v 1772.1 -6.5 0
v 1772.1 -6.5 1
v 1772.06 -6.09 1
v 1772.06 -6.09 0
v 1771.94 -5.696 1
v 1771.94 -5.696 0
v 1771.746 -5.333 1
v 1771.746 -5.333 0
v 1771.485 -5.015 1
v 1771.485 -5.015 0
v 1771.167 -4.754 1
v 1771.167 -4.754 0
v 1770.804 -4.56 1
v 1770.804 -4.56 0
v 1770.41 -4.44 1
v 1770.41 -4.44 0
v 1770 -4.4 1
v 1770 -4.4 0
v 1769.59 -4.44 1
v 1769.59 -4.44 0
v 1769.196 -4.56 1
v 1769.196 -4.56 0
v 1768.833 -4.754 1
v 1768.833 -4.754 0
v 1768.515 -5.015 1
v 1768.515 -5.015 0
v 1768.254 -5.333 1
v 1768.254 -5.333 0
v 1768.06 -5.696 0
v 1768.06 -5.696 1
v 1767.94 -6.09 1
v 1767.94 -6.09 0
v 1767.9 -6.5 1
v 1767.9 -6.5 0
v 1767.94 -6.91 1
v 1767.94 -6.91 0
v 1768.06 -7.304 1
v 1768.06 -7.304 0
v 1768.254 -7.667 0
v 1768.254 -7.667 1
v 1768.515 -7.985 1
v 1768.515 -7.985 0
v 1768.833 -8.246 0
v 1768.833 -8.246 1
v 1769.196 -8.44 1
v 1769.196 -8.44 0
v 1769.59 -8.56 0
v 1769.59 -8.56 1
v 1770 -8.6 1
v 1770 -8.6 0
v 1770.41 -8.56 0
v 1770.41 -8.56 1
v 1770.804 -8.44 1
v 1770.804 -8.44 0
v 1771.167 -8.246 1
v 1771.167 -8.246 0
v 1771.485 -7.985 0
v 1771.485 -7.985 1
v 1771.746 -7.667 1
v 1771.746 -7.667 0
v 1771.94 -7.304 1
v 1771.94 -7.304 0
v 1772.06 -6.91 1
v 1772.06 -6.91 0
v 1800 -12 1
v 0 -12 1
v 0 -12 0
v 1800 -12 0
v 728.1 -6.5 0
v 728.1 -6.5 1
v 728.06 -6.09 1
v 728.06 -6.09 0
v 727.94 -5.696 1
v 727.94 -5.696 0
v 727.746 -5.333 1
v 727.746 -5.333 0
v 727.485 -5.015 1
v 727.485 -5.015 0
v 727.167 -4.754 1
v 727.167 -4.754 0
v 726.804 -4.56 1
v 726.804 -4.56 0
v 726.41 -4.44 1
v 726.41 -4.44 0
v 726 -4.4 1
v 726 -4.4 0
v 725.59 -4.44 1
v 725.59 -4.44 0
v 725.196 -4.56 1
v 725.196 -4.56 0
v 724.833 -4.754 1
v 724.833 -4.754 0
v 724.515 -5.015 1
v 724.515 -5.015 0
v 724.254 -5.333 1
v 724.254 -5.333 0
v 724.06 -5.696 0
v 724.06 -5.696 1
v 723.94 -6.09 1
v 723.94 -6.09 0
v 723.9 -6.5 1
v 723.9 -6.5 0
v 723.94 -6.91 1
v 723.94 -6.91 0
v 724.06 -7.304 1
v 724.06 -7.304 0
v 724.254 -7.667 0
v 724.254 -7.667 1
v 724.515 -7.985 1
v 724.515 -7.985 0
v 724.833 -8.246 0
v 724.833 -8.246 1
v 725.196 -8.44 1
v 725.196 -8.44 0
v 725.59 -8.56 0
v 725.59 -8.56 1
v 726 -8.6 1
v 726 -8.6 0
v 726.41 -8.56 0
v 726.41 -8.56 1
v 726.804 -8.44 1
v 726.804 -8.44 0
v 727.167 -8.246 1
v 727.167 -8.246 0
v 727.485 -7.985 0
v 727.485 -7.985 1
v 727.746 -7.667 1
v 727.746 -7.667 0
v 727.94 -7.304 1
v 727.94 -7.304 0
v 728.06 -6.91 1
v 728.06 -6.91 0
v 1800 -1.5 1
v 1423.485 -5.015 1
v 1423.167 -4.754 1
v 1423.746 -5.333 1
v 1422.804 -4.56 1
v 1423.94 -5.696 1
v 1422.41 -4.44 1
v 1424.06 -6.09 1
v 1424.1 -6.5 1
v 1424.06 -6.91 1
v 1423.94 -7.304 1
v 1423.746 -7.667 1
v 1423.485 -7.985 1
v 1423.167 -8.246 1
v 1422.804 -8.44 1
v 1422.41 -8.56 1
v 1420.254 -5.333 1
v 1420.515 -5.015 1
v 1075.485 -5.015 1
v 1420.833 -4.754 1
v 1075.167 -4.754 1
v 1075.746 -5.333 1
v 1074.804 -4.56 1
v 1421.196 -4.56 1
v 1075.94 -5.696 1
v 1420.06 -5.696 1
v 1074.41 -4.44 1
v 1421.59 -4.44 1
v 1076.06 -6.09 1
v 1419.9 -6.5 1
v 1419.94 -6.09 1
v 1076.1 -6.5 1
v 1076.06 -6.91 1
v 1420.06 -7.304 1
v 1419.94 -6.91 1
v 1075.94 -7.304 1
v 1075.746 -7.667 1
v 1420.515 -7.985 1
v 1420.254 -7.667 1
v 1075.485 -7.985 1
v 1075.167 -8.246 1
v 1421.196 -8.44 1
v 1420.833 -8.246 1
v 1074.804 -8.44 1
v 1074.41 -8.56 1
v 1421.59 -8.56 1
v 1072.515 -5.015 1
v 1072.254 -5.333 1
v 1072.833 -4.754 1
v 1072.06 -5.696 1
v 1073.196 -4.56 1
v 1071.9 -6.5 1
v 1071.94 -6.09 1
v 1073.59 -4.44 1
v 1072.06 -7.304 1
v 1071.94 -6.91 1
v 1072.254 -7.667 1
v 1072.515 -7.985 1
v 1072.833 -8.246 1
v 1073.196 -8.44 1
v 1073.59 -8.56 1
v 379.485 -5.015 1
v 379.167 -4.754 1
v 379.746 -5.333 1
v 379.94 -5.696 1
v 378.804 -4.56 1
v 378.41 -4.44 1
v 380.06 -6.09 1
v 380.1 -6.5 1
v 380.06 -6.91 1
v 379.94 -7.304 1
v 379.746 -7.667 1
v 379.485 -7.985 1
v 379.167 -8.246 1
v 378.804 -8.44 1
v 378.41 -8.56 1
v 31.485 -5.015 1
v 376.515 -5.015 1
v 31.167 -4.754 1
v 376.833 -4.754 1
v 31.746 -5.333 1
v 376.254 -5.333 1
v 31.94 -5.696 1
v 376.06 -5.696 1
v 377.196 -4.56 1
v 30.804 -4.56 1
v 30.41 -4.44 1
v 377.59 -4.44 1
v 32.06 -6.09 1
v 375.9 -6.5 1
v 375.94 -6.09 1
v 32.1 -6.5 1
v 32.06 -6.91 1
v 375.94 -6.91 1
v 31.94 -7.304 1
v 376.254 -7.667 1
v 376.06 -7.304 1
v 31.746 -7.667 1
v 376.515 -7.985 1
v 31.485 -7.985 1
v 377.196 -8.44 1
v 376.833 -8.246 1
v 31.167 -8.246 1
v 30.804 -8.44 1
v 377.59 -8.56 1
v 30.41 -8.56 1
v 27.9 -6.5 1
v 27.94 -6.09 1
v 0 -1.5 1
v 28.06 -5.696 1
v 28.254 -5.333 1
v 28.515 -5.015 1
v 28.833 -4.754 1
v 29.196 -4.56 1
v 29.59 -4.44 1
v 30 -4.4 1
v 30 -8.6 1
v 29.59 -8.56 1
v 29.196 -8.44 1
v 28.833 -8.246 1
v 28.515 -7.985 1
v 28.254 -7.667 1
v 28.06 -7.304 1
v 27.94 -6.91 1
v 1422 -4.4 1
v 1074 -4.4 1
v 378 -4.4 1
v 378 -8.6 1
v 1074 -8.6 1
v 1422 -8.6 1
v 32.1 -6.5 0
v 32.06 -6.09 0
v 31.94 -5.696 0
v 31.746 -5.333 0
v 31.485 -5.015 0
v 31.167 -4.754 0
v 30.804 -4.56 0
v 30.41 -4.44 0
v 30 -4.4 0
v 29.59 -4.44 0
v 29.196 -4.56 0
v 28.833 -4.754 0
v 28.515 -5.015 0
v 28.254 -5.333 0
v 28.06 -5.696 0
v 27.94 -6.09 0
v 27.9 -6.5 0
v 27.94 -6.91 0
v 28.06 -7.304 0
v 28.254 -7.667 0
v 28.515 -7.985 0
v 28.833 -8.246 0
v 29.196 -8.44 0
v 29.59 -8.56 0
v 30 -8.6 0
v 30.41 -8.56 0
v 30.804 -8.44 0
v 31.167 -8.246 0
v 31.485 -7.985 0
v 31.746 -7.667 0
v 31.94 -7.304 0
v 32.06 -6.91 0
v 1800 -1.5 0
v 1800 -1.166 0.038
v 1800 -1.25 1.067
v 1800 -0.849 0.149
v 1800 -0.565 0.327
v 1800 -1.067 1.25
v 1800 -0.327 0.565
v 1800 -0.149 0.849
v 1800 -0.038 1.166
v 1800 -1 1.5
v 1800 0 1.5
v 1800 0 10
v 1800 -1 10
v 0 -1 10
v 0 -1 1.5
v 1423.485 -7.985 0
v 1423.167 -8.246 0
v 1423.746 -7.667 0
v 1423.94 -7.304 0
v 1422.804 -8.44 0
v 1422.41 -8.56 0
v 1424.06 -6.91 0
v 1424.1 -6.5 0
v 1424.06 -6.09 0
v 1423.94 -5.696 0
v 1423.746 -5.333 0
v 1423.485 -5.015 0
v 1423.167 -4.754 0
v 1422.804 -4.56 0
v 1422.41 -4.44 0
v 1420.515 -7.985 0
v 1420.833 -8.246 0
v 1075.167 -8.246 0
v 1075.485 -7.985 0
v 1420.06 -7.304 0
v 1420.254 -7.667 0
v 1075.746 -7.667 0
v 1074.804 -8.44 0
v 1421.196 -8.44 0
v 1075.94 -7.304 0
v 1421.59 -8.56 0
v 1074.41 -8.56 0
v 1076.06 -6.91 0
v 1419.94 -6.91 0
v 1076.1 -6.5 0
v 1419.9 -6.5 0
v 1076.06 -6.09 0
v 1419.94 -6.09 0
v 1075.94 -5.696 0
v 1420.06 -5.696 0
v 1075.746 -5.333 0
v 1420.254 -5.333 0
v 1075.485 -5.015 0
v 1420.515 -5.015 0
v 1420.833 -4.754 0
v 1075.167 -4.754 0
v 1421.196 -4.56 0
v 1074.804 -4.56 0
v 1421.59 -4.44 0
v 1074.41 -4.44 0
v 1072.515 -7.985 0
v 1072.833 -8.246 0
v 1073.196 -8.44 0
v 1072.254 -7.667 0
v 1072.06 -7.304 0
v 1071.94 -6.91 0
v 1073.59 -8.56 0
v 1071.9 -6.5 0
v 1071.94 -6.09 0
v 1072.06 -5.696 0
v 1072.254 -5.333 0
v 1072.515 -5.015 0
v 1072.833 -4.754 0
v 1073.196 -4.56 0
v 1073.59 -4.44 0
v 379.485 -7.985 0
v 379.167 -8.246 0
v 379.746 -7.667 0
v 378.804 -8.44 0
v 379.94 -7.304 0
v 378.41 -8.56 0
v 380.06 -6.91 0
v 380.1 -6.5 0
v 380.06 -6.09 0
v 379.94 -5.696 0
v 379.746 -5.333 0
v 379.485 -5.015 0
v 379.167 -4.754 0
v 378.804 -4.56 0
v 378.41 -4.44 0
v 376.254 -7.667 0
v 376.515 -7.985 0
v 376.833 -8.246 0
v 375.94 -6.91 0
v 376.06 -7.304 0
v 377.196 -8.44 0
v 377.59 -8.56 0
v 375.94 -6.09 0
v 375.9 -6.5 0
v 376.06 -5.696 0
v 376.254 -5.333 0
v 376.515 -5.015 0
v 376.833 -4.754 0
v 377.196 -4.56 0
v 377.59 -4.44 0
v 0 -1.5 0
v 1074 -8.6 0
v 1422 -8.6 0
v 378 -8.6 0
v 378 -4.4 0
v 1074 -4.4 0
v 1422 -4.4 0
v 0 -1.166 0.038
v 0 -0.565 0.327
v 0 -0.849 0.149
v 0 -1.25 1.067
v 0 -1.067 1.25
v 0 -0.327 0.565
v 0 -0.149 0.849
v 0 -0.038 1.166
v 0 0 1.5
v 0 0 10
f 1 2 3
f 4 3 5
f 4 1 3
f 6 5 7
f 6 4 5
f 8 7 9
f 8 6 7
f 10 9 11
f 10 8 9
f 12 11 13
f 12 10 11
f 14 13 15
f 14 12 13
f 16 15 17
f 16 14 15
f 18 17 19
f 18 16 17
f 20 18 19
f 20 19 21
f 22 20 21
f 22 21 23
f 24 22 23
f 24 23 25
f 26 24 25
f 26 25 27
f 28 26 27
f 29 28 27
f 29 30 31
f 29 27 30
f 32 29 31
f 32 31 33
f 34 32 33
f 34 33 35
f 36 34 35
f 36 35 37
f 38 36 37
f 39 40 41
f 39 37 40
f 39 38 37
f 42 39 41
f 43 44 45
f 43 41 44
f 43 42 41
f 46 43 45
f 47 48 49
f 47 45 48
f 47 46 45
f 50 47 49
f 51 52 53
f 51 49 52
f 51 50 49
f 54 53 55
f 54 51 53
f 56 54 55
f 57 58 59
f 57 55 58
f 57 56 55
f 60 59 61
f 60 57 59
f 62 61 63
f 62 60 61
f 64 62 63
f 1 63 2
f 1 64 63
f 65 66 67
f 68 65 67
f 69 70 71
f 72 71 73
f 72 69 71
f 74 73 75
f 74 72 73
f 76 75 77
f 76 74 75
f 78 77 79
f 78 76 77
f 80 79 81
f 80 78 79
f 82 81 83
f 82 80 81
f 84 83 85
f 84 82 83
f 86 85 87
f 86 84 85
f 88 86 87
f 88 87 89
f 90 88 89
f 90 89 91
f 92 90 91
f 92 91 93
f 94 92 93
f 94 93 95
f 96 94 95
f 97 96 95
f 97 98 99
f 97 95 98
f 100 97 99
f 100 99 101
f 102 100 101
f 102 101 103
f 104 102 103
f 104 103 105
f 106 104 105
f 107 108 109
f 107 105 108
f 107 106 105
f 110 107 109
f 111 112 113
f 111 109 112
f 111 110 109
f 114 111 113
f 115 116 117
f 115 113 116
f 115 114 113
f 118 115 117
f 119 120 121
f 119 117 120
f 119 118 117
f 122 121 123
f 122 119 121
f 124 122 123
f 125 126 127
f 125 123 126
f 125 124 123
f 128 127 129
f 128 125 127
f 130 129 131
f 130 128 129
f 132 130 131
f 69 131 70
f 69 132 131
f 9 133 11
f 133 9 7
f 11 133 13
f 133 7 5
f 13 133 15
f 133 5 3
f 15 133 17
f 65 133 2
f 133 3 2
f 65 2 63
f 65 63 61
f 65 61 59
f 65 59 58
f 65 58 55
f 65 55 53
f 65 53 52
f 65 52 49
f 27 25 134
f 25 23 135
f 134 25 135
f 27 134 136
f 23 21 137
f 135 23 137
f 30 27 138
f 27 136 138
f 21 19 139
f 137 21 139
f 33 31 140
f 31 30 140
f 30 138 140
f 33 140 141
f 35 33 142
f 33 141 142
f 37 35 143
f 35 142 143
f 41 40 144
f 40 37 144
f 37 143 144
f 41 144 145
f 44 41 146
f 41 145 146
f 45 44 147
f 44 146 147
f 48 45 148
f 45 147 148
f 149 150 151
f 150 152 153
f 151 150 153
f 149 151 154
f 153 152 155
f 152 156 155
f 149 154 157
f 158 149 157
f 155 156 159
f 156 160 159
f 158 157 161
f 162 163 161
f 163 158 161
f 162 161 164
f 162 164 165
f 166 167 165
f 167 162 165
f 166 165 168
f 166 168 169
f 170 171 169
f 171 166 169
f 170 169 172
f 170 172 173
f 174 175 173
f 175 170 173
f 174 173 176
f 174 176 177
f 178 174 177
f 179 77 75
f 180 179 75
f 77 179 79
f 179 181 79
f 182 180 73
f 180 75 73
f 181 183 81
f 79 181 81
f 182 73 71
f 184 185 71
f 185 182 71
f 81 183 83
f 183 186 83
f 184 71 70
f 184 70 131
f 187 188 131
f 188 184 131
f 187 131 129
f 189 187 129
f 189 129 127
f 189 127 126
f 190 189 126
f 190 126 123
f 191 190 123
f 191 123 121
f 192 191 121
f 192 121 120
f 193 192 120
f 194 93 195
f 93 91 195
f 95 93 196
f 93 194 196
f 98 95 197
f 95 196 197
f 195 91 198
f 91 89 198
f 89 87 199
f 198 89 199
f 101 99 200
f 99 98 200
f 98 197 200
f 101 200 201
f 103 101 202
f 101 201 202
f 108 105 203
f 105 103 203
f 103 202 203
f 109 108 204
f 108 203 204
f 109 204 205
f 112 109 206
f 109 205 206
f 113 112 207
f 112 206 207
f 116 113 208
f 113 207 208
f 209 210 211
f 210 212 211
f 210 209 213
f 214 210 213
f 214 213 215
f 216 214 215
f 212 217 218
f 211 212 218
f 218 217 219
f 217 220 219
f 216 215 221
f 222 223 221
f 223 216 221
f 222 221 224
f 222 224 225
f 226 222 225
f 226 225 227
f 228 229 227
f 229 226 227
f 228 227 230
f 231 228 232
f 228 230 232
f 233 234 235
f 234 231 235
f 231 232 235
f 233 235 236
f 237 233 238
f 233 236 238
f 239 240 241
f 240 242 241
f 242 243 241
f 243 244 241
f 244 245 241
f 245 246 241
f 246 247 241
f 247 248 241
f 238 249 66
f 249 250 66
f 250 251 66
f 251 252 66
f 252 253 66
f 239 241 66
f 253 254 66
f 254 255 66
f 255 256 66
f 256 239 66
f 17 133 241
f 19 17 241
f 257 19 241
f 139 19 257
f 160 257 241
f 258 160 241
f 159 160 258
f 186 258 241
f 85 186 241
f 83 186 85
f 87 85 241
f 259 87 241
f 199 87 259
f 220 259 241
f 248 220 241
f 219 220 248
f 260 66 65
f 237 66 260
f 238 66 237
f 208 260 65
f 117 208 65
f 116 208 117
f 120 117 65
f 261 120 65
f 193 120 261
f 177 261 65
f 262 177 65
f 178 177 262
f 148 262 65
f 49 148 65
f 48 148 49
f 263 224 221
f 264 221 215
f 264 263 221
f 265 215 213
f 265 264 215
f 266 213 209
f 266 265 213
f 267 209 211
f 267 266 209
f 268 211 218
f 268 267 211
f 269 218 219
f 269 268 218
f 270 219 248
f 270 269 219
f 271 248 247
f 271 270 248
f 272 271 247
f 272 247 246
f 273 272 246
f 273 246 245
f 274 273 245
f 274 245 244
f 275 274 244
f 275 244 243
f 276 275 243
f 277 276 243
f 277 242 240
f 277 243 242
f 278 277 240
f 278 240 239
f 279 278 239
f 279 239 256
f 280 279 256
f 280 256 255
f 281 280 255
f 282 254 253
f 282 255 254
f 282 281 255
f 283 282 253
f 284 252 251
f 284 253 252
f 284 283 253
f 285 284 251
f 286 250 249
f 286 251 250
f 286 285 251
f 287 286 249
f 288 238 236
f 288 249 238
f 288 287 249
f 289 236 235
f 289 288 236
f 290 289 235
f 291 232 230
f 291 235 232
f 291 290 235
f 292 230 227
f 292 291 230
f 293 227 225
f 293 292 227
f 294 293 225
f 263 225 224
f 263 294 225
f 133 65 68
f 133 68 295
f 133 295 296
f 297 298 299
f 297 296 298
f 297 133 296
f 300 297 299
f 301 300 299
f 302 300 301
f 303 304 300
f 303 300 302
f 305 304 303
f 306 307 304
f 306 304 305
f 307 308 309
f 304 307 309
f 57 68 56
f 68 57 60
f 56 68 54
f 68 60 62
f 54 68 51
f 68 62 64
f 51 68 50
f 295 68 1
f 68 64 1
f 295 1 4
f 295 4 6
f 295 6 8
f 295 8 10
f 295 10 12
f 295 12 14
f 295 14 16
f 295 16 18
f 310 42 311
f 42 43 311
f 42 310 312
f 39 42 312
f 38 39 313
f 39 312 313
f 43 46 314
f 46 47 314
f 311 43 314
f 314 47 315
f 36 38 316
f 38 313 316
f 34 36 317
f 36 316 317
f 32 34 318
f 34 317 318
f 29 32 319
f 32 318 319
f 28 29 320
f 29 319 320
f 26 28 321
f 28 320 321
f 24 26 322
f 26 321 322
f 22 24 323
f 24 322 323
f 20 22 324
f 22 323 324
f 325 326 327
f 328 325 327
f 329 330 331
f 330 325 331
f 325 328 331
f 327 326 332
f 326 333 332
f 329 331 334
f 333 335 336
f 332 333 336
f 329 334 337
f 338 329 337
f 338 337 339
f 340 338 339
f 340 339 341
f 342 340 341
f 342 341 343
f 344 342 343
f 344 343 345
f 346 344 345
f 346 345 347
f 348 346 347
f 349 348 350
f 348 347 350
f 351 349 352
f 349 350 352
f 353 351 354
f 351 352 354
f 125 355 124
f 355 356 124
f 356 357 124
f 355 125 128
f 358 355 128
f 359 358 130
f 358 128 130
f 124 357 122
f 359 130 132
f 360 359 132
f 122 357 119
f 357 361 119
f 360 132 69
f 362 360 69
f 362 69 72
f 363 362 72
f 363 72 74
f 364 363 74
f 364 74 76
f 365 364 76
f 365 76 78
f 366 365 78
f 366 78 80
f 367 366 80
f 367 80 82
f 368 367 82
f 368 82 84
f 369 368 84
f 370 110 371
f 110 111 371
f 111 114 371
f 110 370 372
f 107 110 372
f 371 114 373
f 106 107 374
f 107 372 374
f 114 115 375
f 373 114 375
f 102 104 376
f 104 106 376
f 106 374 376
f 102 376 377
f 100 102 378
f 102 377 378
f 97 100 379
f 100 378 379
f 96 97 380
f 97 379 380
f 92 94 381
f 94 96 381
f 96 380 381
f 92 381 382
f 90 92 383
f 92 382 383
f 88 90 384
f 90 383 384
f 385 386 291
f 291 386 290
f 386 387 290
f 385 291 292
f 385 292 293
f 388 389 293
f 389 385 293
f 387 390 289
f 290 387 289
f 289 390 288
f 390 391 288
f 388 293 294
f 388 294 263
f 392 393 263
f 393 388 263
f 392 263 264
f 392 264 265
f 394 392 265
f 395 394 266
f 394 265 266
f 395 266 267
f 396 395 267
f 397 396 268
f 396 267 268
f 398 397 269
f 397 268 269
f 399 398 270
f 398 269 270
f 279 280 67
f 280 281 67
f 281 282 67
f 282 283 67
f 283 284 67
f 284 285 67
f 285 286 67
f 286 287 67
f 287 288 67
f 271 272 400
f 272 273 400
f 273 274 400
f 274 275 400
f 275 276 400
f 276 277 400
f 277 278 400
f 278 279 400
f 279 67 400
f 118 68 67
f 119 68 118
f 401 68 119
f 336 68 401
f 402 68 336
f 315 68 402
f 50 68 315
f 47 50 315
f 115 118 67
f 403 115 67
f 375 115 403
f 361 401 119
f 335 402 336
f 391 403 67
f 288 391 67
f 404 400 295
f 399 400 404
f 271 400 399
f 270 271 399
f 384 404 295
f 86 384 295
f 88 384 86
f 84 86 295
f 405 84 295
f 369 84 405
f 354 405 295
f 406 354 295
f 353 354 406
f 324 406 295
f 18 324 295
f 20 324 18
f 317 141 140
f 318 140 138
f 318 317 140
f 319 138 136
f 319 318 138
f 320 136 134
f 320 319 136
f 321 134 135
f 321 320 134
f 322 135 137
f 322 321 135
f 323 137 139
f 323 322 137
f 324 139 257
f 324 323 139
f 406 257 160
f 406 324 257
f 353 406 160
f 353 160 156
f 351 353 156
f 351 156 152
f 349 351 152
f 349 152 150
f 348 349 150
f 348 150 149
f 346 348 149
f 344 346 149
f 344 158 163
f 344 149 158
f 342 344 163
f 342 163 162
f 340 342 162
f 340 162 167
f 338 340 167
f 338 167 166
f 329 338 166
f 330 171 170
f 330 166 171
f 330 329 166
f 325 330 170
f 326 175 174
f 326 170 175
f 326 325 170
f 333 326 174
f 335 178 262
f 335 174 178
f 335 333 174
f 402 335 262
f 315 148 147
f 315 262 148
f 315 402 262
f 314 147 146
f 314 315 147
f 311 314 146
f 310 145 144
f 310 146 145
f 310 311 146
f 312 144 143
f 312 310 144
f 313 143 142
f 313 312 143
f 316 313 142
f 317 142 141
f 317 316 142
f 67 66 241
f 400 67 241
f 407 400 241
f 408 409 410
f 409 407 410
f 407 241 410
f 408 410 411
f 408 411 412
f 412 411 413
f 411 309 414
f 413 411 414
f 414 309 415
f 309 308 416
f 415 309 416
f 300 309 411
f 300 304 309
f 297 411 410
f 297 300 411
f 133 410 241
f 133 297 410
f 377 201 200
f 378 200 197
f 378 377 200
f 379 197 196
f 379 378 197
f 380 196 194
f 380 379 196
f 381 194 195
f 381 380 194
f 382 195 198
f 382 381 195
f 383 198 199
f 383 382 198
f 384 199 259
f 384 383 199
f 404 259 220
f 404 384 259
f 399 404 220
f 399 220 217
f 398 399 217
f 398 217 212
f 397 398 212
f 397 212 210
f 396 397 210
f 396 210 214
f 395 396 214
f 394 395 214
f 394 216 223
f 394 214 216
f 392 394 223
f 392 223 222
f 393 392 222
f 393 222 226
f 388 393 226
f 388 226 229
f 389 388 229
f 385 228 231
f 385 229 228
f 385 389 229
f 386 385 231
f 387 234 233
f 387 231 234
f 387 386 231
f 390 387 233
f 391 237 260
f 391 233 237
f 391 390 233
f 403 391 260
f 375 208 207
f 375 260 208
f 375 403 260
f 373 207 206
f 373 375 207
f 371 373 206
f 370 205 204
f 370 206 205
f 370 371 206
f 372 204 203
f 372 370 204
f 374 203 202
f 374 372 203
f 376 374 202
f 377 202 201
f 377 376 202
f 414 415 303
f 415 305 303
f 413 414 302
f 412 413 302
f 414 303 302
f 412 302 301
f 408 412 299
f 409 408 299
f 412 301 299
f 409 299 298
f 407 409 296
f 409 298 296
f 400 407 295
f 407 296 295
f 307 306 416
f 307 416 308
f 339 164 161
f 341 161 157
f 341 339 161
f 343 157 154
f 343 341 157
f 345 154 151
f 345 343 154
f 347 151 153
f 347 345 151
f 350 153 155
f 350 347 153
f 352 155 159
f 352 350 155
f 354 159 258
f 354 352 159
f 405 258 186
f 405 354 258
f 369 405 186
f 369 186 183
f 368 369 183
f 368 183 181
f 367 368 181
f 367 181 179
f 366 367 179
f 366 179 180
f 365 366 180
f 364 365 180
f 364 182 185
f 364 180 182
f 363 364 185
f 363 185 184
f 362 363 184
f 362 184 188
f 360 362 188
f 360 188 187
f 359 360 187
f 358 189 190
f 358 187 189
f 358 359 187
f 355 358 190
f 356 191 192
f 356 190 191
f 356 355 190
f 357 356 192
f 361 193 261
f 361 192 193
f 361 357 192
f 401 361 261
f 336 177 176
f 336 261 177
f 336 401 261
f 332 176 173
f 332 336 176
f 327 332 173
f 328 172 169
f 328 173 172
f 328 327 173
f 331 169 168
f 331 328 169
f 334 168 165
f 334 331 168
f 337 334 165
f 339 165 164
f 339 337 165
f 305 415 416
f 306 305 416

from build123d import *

# Parameters (mm, degrees)
F1_DEPTH = 1800
F2_R     = 0.5
F3_R     = 1.5
F4_R     = 2.1
F5_DEPTH = 25


with BuildPart() as f1:
    # F0 (on Right) → F1 (new body)
    with BuildSketch(Plane.YZ):
        Polygon((-12, 0), (0, 0), (0, 10), (-1, 10), (-1, 1), (-12, 1), align=None)
    extrude(amount=F1_DEPTH)

    # F2
    f2_edges = [f1.edges().sort_by_distance(p)[0] for p in [
        (900, -1, 1),
    ]]
    fillet(f2_edges, radius=F2_R)

    # F3
    f3_edges = [f1.edges().sort_by_distance(p)[0] for p in [
        (900, 0, 0),
    ]]
    fillet(f3_edges, radius=F3_R)

    # F4 (on Top) → F5 (cut)
    with BuildSketch(Plane.XY):
        with Locations((30, -6.5)):
            Circle(F4_R)
        with Locations((378, -6.5)):
            Circle(F4_R)
        with Locations((726, -6.5)):
            Circle(F4_R)
        with Locations((1074, -6.5)):
            Circle(F4_R)
        with Locations((1422, -6.5)):
            Circle(F4_R)
        with Locations((1770, -6.5)):
            Circle(F4_R)
    extrude(amount=F5_DEPTH, mode=Mode.SUBTRACT)


solid = f1.part
